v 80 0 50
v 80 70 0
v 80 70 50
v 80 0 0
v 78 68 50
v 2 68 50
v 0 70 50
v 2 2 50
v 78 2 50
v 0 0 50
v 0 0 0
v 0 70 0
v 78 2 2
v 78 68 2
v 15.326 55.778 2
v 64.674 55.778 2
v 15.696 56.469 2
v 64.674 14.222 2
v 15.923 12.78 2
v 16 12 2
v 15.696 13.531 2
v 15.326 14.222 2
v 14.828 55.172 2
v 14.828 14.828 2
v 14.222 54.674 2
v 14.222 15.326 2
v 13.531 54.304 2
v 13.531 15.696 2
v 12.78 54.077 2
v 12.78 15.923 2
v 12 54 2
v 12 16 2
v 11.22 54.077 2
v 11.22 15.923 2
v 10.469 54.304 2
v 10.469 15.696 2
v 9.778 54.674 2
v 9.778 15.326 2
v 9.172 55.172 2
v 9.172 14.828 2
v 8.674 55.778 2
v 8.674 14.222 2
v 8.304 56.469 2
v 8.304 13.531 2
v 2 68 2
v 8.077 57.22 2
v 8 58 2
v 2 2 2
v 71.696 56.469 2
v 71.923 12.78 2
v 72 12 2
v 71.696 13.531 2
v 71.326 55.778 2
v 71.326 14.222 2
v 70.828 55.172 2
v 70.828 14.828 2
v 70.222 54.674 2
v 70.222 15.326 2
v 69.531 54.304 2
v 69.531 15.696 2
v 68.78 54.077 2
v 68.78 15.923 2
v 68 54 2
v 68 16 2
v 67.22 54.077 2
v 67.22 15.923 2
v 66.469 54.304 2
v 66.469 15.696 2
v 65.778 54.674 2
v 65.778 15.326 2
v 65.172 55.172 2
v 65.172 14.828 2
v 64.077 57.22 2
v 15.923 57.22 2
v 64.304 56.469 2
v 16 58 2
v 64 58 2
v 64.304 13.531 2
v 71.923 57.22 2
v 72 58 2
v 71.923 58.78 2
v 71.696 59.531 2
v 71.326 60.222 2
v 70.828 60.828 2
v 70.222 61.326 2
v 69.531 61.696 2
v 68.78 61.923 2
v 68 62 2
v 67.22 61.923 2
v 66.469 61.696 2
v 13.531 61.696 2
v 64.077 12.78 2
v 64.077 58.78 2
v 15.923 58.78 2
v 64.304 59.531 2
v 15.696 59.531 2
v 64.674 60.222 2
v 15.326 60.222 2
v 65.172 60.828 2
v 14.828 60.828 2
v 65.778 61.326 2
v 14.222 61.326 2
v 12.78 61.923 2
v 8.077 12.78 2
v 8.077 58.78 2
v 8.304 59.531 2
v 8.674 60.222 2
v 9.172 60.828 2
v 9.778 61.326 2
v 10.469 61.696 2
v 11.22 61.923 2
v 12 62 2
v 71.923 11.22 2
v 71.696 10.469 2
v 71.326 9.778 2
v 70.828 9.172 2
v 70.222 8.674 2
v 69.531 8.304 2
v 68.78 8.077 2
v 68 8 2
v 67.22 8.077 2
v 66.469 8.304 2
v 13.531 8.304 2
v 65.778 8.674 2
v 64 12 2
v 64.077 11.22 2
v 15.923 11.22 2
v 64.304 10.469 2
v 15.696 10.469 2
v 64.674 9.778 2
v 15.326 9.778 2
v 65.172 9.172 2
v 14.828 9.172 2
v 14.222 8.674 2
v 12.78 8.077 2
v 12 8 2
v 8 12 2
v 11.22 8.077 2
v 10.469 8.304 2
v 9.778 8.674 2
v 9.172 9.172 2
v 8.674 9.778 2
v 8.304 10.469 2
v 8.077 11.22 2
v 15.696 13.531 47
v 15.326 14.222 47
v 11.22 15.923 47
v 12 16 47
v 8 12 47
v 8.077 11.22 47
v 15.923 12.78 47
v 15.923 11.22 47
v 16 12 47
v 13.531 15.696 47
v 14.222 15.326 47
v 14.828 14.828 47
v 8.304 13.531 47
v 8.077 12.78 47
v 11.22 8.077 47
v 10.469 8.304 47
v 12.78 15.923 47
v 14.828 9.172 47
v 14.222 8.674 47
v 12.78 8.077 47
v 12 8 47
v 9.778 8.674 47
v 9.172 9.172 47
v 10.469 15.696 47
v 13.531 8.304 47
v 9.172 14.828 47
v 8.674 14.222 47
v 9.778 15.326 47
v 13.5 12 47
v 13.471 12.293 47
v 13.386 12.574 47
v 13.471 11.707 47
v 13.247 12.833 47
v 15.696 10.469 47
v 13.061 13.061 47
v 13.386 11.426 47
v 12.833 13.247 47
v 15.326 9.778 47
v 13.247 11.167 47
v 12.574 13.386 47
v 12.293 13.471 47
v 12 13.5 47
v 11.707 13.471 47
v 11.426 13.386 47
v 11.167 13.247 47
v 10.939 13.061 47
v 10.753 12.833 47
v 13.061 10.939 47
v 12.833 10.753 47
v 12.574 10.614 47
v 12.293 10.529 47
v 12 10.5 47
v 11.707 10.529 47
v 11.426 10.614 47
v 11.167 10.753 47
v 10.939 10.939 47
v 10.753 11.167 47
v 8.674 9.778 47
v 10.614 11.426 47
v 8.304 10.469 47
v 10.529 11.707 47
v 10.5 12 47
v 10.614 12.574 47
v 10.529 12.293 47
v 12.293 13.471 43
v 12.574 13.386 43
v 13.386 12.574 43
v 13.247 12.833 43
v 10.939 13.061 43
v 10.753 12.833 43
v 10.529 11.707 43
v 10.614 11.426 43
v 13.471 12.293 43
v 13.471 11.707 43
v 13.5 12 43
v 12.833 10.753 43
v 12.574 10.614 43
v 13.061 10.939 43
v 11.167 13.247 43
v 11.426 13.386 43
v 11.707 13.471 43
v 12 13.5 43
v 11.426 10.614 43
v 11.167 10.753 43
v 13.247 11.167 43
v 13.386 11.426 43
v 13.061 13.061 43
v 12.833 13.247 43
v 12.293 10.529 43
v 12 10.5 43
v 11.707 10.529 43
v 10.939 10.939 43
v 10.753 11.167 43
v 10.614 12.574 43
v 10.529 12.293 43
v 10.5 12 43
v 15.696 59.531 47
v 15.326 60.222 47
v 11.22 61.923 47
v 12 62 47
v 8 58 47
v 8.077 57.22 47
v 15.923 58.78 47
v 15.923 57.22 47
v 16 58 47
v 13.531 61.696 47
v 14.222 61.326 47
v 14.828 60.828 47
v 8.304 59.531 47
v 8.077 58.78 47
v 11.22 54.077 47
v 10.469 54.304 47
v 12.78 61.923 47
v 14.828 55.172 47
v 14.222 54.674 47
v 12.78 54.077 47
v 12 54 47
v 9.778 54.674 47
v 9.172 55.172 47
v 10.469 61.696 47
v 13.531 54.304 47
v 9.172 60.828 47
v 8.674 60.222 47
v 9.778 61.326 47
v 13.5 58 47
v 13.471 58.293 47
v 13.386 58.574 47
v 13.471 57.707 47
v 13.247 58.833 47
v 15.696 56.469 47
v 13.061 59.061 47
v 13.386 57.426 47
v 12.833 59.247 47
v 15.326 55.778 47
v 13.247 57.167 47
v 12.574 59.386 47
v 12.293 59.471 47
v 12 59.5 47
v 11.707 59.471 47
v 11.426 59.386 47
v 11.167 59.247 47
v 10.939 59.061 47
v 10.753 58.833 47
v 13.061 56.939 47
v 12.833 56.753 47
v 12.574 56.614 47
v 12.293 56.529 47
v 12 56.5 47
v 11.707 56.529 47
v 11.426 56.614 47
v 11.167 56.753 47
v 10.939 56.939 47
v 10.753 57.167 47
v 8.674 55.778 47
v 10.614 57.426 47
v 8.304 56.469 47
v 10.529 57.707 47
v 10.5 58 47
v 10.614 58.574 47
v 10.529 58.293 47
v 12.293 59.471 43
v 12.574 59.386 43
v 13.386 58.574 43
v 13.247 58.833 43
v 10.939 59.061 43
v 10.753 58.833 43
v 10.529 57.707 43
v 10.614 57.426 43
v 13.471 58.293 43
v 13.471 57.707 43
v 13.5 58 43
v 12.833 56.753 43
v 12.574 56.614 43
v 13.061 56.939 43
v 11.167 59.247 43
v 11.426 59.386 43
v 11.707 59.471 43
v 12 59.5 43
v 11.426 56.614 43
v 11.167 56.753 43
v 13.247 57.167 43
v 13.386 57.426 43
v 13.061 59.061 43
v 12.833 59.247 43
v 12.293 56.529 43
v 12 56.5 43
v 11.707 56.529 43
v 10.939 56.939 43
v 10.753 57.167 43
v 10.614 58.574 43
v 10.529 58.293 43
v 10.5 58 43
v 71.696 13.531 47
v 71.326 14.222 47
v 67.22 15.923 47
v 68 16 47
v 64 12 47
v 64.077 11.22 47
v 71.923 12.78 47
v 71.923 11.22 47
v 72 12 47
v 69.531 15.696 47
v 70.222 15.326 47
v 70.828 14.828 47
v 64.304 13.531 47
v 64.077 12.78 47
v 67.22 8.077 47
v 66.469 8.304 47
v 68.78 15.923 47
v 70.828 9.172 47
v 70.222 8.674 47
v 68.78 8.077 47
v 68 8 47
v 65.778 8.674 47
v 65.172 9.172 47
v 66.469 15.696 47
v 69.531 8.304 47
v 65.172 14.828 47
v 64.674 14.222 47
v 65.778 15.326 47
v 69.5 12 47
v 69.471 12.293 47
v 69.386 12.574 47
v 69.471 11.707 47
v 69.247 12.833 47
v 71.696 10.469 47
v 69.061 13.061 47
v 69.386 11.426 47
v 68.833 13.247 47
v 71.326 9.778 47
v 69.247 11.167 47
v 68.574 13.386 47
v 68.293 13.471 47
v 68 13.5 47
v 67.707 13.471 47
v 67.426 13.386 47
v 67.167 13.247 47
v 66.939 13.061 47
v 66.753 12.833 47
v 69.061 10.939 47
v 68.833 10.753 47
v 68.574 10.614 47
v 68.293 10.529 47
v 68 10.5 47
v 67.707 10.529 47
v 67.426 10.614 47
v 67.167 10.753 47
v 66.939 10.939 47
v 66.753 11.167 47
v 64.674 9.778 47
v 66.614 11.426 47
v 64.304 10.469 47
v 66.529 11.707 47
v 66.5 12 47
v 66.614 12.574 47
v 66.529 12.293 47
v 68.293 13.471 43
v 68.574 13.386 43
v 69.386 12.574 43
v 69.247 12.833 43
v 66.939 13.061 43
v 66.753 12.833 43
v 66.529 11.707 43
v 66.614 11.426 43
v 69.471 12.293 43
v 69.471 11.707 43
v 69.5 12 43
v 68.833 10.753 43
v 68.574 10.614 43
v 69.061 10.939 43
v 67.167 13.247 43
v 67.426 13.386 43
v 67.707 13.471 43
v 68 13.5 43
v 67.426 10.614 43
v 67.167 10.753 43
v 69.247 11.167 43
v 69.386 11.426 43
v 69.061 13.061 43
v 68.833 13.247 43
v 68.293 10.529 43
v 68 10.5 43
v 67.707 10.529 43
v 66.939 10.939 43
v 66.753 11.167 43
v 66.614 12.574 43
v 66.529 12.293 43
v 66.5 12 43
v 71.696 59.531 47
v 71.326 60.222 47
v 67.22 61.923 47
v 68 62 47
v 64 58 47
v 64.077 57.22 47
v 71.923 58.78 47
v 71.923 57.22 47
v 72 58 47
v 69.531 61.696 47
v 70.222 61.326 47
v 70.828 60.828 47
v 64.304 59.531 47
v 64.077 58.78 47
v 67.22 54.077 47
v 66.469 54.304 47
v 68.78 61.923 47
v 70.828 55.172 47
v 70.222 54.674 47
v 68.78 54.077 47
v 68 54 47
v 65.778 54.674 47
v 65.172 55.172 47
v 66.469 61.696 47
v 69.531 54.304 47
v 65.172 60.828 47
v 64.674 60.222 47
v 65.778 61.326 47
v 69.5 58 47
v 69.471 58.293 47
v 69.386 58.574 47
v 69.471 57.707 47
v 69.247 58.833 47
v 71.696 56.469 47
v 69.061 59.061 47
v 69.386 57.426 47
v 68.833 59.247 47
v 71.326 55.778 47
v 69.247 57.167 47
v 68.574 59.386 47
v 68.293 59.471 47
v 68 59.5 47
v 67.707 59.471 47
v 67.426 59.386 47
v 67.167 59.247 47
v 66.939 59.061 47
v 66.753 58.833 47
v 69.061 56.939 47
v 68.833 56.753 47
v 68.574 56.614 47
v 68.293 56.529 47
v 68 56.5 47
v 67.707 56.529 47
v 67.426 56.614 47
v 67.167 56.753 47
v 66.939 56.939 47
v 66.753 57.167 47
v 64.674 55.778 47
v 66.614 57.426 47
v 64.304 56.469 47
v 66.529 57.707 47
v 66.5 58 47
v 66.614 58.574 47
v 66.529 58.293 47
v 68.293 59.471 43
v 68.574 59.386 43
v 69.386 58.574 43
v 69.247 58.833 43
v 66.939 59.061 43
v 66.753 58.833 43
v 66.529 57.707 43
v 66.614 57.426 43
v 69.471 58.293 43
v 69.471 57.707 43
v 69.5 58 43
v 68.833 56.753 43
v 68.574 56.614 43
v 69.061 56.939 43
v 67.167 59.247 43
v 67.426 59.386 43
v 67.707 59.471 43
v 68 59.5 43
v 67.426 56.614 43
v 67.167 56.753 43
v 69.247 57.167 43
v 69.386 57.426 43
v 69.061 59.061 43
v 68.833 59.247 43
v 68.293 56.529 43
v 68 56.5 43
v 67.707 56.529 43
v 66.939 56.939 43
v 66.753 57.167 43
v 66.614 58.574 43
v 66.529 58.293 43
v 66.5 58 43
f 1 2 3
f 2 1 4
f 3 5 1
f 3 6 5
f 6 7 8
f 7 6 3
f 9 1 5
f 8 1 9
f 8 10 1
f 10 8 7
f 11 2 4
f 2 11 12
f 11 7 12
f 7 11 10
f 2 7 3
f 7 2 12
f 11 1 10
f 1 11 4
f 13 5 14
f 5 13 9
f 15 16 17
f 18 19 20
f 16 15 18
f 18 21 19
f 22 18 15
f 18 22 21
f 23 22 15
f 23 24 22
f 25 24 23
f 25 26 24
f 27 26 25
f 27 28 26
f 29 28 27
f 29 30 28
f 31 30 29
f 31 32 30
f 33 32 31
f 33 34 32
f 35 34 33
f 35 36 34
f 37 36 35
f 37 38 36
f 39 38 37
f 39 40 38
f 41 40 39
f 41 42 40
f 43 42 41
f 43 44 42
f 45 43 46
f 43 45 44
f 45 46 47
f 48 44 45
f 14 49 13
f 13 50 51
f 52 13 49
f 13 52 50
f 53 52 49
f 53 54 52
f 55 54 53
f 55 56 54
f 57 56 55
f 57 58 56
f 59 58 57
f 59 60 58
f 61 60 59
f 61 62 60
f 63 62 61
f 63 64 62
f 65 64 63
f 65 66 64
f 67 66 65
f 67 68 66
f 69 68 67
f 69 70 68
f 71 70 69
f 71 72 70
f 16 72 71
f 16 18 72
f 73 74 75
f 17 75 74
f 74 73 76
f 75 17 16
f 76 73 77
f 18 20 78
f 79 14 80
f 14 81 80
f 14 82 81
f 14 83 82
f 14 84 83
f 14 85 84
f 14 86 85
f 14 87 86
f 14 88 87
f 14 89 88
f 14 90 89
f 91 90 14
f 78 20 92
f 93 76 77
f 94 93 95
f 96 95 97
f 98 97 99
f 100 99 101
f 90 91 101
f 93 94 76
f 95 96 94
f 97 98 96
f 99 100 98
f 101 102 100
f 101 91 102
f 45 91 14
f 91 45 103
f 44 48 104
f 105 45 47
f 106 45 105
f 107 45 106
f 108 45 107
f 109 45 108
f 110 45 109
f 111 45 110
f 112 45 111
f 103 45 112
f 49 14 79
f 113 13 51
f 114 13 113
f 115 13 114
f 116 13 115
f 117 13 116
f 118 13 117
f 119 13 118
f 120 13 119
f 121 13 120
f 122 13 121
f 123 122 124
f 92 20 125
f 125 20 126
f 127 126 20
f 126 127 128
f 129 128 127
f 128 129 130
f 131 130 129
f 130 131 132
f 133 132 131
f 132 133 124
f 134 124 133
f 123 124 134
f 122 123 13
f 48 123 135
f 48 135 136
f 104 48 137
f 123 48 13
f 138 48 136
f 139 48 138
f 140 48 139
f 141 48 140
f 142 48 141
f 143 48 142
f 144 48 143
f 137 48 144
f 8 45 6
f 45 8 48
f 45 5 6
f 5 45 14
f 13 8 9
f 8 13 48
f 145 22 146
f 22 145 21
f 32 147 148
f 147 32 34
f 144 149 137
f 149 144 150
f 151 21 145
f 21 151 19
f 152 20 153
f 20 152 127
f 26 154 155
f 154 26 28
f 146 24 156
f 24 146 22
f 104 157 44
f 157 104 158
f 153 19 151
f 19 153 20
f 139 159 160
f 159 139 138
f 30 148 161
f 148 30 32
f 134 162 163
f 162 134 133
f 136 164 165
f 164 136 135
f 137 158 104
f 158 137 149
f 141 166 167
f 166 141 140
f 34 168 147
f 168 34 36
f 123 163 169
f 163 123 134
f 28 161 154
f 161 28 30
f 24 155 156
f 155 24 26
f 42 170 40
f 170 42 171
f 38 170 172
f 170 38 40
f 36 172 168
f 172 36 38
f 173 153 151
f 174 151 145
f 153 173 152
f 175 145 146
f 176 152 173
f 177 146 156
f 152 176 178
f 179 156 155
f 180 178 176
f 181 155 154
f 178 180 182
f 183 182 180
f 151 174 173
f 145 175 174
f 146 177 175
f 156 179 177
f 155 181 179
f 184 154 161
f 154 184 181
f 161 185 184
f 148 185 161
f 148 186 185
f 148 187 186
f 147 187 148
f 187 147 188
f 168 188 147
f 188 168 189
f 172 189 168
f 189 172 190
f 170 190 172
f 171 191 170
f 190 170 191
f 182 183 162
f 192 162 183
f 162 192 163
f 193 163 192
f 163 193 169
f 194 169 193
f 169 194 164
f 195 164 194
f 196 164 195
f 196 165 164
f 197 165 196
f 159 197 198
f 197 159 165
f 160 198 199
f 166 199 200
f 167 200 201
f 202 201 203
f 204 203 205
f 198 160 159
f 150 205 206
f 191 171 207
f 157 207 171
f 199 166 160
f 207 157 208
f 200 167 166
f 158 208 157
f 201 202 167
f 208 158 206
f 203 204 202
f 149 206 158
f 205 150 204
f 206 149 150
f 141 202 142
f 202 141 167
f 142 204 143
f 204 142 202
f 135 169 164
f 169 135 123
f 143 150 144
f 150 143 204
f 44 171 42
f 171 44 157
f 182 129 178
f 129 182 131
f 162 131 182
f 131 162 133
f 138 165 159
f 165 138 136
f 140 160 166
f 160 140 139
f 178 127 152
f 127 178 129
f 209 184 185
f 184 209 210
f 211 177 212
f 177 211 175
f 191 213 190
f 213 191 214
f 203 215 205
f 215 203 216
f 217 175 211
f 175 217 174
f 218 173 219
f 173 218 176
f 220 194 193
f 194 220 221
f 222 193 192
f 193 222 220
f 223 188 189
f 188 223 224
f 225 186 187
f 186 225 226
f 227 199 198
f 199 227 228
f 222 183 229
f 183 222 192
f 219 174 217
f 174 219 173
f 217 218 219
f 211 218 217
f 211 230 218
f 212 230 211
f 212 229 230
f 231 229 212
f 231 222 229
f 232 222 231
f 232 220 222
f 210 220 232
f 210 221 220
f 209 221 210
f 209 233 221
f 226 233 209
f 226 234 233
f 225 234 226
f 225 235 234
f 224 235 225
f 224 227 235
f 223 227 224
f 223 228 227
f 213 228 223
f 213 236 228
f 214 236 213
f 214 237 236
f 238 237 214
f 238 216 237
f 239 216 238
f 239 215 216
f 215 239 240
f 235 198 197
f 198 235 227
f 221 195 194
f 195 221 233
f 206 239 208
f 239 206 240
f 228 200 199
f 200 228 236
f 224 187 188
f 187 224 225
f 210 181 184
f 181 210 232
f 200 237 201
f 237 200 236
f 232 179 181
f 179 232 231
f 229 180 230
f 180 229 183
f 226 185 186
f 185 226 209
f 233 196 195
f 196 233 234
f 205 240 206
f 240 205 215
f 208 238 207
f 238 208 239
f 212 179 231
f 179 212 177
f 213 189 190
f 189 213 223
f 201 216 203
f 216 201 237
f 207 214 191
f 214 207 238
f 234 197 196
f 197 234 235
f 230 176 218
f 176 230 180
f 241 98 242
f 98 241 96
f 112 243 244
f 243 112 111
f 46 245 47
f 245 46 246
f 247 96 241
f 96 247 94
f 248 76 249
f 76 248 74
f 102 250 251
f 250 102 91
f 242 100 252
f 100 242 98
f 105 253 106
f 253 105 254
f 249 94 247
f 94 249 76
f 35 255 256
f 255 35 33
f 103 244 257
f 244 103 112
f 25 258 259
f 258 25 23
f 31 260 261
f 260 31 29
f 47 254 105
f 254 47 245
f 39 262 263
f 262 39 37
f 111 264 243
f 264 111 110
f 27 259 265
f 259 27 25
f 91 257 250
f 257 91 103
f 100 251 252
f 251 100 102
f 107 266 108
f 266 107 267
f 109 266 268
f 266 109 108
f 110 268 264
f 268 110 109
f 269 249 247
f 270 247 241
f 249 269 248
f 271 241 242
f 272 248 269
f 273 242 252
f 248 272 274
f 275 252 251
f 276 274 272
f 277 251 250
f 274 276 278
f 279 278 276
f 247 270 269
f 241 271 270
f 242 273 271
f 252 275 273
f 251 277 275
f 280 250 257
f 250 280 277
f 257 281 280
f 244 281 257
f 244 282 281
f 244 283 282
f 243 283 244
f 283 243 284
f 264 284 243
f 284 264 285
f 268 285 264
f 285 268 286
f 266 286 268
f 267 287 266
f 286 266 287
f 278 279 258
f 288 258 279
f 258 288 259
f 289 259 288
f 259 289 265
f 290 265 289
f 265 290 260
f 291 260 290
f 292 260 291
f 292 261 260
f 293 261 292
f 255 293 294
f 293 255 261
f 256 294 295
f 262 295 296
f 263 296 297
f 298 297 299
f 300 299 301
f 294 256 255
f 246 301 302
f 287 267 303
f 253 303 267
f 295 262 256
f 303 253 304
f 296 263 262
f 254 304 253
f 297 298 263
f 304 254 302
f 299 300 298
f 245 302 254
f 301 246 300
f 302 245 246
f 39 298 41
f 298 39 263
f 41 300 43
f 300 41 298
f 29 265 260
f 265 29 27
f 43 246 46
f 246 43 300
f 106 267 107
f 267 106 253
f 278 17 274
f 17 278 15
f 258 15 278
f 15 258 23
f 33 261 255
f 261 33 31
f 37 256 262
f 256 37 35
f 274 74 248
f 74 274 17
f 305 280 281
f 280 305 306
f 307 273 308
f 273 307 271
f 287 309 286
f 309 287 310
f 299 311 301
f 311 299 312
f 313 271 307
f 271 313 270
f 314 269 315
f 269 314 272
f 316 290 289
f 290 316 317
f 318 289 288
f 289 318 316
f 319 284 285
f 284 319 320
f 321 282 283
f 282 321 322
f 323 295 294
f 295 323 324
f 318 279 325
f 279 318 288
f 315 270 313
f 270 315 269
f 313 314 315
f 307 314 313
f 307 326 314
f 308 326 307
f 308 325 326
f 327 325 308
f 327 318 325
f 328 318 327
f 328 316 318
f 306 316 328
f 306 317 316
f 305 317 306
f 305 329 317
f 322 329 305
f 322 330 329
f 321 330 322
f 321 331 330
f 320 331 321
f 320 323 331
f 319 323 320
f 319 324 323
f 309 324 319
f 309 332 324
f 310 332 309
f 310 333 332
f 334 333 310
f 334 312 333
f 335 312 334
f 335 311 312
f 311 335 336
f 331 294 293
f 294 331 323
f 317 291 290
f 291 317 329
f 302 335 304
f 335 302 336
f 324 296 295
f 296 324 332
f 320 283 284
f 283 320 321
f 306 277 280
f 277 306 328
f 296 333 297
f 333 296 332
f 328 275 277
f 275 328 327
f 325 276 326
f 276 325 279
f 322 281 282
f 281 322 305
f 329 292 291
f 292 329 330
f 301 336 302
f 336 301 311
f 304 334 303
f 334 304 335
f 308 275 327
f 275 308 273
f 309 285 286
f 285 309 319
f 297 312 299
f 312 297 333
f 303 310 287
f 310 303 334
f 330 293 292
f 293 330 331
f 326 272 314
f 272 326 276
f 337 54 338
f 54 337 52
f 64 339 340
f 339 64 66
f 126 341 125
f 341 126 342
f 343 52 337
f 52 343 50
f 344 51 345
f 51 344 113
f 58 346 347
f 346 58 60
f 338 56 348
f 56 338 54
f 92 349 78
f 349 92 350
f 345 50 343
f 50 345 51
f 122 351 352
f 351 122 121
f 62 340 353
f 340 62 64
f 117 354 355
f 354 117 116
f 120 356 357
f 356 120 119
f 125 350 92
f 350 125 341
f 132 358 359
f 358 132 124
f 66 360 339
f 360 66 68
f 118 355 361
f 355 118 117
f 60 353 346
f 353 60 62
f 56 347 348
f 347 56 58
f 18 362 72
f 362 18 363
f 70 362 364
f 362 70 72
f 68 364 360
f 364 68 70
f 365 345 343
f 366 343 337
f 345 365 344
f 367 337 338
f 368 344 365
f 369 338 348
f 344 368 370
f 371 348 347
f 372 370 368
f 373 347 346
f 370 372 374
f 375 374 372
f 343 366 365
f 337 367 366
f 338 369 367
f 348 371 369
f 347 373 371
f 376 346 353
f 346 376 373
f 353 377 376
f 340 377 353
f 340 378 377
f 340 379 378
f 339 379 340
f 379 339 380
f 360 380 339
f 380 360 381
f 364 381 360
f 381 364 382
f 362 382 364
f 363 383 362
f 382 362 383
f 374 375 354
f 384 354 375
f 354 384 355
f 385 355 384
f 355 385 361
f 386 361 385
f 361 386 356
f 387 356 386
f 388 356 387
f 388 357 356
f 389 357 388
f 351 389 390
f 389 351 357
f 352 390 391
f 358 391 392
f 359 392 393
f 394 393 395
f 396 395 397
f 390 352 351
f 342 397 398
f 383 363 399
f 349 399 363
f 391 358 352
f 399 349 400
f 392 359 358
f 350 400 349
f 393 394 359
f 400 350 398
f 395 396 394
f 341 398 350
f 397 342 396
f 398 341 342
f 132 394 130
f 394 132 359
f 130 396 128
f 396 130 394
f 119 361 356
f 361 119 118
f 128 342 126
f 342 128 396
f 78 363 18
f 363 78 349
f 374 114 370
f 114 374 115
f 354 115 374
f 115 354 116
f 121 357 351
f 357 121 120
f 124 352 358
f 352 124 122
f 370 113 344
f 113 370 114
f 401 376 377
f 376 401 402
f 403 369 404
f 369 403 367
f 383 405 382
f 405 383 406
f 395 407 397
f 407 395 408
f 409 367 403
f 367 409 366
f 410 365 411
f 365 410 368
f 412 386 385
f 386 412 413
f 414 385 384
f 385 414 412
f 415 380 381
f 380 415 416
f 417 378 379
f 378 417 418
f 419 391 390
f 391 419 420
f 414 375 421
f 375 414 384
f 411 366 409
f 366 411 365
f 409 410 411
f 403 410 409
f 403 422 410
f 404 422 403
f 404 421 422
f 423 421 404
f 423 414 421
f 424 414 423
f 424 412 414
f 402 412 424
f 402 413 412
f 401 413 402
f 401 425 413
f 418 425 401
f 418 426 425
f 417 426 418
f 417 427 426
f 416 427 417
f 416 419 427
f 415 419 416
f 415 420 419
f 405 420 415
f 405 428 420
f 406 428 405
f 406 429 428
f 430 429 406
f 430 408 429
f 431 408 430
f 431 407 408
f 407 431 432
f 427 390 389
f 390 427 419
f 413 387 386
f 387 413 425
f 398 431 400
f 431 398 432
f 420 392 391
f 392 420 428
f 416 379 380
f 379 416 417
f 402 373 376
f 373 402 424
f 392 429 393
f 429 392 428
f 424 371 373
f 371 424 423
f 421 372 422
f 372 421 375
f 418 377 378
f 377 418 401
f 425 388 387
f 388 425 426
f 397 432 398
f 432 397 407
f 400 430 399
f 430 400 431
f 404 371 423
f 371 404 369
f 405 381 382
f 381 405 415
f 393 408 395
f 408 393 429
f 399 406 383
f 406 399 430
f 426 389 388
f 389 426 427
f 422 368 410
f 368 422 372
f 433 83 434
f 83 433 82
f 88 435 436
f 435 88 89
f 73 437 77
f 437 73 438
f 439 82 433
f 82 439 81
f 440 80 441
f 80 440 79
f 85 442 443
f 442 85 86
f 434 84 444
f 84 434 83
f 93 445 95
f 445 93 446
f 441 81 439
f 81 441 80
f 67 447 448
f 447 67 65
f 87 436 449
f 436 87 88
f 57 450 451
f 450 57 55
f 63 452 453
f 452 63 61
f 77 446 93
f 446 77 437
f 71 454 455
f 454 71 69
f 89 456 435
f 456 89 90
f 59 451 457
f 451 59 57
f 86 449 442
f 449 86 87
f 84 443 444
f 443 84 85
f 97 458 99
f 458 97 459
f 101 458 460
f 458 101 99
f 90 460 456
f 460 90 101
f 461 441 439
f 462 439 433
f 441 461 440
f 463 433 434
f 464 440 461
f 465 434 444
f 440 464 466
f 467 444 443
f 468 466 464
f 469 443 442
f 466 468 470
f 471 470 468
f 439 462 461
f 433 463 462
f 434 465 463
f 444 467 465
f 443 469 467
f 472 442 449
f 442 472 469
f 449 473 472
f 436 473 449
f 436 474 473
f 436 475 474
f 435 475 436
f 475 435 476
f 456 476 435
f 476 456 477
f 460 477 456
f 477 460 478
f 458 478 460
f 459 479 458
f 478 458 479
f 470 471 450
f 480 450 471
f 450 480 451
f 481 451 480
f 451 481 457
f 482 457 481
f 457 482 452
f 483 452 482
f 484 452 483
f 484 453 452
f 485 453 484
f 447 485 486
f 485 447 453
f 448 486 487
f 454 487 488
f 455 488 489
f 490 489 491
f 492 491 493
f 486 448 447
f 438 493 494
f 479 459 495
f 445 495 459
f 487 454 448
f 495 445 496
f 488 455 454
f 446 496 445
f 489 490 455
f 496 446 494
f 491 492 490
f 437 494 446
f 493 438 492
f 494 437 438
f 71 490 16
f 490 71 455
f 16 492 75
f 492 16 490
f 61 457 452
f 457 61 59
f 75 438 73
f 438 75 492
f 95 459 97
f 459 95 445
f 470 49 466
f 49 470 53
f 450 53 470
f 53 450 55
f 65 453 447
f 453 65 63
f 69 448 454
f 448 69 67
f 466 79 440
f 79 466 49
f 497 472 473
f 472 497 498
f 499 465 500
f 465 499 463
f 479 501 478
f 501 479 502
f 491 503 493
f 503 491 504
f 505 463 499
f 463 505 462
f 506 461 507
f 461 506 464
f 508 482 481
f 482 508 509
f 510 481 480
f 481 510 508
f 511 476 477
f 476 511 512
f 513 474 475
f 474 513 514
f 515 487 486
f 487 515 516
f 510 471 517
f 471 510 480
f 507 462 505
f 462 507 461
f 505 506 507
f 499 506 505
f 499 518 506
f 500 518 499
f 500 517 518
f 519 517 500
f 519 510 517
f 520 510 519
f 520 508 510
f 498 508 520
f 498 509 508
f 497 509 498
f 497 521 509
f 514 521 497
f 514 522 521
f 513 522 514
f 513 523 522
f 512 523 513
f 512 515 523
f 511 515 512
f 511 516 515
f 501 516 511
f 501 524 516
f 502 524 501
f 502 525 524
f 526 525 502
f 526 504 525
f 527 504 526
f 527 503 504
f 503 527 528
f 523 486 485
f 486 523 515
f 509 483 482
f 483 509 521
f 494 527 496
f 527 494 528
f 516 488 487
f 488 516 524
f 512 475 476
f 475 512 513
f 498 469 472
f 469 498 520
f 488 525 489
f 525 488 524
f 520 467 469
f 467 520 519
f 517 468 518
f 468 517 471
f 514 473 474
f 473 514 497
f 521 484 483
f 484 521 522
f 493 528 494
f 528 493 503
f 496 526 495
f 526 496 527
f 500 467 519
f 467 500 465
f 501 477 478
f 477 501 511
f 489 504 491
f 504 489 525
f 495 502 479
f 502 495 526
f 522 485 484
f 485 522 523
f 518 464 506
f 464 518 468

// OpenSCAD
$fn = 32;

// ----------------------------------------------------------------------
// Enclosure box: bosses enclosure
// ----------------------------------------------------------------------

// --- parameters (mm) ---
box_l = 80;               // outer length, X
box_w = 70;               // outer width, Y
box_h = 50;               // outer height
wall_t = 2;               // wall thickness
boss_r = 4;               // corner boss radius
hole_r = 1.5;             // boss screw hole radius
boss_in = 12;             // boss inset from the corners

inner_h = box_h - wall_t;  // cavity depth
boss_h = inner_h - 2;  // corner boss height

difference() {
  union() {
    difference() {
      cube([box_l, box_w, box_h]);
      translate([wall_t, wall_t, wall_t])
        cube([box_l - 2 * wall_t, box_w - 2 * wall_t, box_h]);
    }
    for (sx = [0, 1], sy = [0, 1])
      translate([sx ? box_l - boss_in : boss_in,
                 sy ? box_w - boss_in : boss_in, wall_t - 1])
        difference() {
          cylinder(r = boss_r, h = boss_h);
          translate([0, 0, boss_h - 4])
            cylinder(r = hole_r, h = 5);
        }
  }
}
